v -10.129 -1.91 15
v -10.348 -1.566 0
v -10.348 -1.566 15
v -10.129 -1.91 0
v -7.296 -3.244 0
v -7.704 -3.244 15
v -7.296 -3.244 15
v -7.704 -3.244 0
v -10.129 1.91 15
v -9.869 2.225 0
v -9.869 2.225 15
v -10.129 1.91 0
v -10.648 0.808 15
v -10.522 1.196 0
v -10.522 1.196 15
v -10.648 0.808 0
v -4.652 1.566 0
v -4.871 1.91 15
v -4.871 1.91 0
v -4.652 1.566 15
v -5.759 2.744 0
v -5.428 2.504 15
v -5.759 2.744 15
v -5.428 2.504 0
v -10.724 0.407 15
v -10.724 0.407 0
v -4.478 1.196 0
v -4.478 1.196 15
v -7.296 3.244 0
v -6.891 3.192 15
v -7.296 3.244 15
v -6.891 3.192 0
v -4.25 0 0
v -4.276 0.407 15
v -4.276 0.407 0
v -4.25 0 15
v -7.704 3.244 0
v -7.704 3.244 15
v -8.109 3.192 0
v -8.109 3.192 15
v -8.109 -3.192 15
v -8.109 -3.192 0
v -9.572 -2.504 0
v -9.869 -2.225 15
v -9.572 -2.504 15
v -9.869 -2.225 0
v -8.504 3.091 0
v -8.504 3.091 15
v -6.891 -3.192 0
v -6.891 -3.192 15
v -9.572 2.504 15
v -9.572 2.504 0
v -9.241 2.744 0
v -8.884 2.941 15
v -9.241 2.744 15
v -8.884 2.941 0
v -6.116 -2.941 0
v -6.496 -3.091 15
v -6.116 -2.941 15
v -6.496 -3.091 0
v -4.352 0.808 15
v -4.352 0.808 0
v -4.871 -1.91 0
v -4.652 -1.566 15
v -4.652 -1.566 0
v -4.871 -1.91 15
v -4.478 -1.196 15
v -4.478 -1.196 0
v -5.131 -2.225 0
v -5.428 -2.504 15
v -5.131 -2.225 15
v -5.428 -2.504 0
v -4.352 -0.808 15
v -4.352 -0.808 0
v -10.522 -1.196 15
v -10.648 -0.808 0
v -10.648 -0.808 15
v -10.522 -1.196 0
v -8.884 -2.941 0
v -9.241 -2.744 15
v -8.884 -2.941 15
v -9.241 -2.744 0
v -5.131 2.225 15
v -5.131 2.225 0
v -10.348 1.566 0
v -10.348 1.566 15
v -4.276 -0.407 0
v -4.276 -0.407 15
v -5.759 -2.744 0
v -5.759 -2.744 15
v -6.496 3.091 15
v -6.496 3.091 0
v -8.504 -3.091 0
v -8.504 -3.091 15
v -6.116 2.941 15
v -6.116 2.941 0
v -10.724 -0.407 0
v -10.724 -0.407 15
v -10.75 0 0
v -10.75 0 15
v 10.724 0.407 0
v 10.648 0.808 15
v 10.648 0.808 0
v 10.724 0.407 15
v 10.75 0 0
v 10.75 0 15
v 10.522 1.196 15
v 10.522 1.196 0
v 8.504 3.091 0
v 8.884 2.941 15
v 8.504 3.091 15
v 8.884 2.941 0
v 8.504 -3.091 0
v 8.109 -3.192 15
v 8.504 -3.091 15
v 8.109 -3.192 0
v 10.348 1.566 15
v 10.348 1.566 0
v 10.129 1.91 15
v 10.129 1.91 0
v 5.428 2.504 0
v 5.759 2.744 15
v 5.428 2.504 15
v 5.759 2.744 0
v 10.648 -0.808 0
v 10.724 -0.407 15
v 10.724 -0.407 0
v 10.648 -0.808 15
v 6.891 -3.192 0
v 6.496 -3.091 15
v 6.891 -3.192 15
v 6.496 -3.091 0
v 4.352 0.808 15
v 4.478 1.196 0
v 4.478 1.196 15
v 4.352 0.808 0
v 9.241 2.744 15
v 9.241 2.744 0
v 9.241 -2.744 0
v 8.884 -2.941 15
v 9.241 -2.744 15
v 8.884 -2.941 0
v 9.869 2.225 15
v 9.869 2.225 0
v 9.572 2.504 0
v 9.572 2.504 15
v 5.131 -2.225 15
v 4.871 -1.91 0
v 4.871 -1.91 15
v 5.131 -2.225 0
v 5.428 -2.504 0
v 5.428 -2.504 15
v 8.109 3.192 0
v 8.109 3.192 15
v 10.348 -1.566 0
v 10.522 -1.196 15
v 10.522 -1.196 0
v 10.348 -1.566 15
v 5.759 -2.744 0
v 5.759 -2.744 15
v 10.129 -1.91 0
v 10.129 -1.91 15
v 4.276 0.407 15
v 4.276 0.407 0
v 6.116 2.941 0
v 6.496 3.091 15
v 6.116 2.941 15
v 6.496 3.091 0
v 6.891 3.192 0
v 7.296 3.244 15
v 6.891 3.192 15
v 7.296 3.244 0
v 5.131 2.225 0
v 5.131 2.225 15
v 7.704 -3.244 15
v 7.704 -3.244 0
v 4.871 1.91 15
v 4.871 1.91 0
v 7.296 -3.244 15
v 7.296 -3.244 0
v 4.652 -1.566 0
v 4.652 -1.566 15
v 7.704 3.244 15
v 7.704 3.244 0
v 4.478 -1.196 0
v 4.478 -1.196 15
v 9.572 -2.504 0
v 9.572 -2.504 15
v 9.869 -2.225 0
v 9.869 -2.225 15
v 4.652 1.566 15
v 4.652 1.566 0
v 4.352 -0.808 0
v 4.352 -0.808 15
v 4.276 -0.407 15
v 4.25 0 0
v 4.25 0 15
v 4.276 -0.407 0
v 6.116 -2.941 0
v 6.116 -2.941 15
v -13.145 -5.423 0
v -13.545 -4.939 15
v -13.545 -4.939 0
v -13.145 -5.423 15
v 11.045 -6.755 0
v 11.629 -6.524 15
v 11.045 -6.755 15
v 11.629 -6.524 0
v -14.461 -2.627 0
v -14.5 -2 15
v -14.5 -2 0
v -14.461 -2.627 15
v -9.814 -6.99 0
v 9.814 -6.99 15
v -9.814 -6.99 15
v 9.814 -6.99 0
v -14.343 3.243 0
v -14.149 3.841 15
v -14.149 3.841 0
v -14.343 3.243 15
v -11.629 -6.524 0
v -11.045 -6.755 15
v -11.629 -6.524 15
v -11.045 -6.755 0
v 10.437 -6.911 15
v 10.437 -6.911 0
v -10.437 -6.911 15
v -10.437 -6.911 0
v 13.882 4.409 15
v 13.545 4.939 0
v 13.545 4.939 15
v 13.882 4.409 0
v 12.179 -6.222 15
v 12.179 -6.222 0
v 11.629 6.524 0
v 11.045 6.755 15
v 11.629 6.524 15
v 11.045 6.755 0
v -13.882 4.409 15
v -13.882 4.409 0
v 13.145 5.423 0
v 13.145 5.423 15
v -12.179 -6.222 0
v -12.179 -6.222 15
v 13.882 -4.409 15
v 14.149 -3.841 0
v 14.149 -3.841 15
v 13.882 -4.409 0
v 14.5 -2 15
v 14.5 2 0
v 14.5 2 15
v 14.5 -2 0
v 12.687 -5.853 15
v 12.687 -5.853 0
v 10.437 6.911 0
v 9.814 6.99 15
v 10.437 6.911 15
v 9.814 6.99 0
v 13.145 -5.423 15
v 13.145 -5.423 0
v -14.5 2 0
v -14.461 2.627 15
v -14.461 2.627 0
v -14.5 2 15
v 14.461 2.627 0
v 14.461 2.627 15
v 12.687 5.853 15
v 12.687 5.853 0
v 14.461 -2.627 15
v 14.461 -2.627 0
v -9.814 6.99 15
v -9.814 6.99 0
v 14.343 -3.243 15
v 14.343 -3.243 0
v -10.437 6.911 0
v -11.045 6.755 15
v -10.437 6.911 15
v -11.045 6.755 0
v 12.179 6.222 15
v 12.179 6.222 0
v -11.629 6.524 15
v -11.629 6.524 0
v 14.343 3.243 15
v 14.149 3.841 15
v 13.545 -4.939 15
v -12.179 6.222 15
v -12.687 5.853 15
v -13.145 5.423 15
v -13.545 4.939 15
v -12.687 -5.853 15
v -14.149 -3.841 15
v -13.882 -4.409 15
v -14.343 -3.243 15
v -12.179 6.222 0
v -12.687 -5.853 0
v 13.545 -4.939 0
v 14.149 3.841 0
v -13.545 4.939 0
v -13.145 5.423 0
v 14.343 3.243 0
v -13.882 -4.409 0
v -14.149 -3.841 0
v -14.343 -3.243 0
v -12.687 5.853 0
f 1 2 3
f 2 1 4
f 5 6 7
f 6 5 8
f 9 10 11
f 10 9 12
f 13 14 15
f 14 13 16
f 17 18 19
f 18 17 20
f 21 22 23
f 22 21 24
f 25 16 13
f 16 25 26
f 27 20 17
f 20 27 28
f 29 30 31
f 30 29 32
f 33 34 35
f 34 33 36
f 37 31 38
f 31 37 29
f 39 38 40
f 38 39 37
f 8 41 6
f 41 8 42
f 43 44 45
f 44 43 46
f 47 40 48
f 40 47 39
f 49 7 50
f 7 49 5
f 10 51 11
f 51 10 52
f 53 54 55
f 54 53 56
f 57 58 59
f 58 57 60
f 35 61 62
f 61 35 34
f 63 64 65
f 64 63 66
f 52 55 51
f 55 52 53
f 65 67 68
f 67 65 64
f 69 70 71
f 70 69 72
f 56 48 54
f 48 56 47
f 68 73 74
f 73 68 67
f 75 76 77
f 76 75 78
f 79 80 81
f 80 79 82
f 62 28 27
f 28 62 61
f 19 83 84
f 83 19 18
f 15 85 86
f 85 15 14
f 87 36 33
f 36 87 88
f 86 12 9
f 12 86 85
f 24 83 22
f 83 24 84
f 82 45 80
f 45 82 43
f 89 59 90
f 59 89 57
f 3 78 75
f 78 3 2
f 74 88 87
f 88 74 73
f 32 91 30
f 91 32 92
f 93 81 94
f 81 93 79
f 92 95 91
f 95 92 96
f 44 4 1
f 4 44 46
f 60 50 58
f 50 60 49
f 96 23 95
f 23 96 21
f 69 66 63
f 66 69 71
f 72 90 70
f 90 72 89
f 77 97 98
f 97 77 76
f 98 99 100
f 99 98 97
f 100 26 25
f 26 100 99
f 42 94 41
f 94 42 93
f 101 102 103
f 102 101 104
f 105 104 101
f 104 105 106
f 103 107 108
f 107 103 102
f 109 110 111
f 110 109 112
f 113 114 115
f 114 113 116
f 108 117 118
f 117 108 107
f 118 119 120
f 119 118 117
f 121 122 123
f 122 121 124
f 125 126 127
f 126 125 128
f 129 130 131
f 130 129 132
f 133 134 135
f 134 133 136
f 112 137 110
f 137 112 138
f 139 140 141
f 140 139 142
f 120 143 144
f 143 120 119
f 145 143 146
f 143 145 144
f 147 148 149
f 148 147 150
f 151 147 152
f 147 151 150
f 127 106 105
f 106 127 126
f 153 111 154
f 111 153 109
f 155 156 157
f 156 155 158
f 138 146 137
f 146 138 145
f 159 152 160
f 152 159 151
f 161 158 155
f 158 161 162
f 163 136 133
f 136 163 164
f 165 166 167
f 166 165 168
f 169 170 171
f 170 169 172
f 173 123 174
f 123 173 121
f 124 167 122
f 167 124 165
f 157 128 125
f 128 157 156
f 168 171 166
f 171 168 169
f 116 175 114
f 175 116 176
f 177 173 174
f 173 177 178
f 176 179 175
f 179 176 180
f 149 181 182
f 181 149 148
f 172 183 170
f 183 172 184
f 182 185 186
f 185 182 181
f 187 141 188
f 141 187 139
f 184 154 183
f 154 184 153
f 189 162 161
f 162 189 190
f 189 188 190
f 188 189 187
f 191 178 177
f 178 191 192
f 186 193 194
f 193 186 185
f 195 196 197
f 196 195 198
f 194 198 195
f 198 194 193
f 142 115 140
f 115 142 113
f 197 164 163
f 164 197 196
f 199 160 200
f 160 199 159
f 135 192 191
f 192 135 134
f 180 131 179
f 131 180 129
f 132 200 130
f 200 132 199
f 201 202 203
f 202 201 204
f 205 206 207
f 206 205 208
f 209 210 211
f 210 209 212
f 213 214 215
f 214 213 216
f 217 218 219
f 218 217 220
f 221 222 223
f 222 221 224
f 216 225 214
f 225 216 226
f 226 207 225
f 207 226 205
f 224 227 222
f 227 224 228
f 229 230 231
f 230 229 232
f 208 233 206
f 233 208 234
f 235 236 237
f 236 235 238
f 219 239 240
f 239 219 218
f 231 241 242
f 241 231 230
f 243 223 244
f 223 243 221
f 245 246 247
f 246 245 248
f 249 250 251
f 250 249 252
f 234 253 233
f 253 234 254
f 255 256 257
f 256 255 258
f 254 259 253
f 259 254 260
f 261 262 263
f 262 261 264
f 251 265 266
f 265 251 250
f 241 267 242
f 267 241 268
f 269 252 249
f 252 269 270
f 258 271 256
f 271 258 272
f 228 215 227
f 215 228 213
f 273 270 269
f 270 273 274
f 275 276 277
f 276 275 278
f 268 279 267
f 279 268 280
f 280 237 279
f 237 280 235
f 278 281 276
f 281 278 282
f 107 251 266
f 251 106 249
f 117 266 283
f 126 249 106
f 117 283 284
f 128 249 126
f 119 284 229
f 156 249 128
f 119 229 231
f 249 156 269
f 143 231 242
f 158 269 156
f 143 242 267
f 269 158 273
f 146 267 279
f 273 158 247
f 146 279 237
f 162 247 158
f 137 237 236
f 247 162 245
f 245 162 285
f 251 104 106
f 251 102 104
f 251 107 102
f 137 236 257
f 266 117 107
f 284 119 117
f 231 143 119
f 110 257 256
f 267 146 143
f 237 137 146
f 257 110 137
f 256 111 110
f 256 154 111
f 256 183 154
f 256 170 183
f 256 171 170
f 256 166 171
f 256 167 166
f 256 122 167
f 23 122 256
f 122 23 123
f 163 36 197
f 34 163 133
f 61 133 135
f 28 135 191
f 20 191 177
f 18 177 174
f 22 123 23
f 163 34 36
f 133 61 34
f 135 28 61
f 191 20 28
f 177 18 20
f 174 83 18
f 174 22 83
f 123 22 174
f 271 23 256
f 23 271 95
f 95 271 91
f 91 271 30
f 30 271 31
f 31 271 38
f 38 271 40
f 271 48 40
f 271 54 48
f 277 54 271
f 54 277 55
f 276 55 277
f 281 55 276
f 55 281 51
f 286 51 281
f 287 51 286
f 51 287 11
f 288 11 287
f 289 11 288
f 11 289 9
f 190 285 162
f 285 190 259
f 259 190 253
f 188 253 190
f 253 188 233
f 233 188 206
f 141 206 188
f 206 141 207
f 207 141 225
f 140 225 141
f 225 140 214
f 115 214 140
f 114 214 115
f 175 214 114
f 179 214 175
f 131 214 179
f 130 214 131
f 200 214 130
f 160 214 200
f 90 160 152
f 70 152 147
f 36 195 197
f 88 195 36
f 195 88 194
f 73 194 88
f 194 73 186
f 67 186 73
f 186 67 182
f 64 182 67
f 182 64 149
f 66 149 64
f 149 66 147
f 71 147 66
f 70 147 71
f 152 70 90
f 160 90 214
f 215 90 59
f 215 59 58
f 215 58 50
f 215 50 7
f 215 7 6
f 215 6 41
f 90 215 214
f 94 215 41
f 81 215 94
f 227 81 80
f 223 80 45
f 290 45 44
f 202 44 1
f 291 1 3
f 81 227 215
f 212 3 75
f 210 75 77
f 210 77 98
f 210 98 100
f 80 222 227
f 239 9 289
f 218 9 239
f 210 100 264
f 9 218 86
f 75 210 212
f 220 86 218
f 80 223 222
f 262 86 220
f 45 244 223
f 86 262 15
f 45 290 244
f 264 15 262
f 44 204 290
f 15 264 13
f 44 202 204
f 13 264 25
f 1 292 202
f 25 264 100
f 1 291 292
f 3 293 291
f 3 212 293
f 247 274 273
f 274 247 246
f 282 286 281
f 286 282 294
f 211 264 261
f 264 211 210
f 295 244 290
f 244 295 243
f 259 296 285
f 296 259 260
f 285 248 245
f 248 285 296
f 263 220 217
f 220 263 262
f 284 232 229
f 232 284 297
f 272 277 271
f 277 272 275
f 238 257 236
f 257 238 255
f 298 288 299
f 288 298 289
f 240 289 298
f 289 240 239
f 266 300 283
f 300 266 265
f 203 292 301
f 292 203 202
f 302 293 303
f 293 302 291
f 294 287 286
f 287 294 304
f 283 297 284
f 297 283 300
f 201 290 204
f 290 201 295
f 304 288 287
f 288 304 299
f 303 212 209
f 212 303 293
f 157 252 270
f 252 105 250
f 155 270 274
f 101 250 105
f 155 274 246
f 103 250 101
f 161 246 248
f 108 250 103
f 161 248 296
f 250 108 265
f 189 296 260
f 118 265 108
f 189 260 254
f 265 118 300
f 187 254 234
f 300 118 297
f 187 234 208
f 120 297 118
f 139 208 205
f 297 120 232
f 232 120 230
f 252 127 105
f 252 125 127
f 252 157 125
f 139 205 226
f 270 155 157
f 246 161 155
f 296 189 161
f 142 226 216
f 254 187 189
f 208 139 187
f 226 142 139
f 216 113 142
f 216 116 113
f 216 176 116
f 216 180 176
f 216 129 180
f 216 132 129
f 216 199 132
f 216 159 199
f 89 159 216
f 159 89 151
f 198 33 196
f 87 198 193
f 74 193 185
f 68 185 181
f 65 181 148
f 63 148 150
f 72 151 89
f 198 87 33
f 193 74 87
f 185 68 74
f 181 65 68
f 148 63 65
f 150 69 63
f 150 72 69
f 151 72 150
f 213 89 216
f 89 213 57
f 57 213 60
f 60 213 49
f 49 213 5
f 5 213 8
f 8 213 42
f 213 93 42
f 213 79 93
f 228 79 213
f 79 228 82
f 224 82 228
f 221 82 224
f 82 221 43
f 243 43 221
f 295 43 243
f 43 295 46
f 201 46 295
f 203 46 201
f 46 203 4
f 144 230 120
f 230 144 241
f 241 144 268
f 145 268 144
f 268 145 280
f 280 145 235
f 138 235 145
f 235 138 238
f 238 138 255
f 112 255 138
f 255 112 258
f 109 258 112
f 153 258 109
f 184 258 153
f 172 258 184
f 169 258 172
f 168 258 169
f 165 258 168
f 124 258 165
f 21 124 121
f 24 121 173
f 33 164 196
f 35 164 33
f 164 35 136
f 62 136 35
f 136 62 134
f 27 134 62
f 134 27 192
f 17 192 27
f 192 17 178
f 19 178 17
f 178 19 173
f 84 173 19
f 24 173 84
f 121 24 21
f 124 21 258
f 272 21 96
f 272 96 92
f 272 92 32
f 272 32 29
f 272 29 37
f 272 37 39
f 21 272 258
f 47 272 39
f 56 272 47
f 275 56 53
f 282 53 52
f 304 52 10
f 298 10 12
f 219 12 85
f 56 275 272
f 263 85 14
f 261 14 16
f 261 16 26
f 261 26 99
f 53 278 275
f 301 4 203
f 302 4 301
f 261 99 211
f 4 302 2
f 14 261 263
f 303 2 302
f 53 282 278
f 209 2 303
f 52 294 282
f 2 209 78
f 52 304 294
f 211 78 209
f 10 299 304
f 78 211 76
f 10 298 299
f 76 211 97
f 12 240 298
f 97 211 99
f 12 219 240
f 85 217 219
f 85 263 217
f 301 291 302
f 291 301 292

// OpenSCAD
$fn = 50;


difference() {
	union() {
		hull() {
			translate(v = [-9.5000000000, 2.0000000000, 0]) {
				cylinder(h = 15, r = 5);
			}
			translate(v = [9.5000000000, 2.0000000000, 0]) {
				cylinder(h = 15, r = 5);
			}
			translate(v = [-9.5000000000, -2.0000000000, 0]) {
				cylinder(h = 15, r = 5);
			}
			translate(v = [9.5000000000, -2.0000000000, 0]) {
				cylinder(h = 15, r = 5);
			}
		}
	}
	union() {
		translate(v = [-7.5000000000, 0.0000000000, -100.0000000000]) {
			cylinder(h = 200, r = 3.2500000000);
		}
		translate(v = [-7.5000000000, 0.0000000000, -100.0000000000]) {
			cylinder(h = 200, r = 3.2500000000);
		}
		translate(v = [7.5000000000, 0.0000000000, -100.0000000000]) {
			cylinder(h = 200, r = 3.2500000000);
		}
		translate(v = [7.5000000000, 0.0000000000, -100.0000000000]) {
			cylinder(h = 200, r = 3.2500000000);
		}
	}
}
